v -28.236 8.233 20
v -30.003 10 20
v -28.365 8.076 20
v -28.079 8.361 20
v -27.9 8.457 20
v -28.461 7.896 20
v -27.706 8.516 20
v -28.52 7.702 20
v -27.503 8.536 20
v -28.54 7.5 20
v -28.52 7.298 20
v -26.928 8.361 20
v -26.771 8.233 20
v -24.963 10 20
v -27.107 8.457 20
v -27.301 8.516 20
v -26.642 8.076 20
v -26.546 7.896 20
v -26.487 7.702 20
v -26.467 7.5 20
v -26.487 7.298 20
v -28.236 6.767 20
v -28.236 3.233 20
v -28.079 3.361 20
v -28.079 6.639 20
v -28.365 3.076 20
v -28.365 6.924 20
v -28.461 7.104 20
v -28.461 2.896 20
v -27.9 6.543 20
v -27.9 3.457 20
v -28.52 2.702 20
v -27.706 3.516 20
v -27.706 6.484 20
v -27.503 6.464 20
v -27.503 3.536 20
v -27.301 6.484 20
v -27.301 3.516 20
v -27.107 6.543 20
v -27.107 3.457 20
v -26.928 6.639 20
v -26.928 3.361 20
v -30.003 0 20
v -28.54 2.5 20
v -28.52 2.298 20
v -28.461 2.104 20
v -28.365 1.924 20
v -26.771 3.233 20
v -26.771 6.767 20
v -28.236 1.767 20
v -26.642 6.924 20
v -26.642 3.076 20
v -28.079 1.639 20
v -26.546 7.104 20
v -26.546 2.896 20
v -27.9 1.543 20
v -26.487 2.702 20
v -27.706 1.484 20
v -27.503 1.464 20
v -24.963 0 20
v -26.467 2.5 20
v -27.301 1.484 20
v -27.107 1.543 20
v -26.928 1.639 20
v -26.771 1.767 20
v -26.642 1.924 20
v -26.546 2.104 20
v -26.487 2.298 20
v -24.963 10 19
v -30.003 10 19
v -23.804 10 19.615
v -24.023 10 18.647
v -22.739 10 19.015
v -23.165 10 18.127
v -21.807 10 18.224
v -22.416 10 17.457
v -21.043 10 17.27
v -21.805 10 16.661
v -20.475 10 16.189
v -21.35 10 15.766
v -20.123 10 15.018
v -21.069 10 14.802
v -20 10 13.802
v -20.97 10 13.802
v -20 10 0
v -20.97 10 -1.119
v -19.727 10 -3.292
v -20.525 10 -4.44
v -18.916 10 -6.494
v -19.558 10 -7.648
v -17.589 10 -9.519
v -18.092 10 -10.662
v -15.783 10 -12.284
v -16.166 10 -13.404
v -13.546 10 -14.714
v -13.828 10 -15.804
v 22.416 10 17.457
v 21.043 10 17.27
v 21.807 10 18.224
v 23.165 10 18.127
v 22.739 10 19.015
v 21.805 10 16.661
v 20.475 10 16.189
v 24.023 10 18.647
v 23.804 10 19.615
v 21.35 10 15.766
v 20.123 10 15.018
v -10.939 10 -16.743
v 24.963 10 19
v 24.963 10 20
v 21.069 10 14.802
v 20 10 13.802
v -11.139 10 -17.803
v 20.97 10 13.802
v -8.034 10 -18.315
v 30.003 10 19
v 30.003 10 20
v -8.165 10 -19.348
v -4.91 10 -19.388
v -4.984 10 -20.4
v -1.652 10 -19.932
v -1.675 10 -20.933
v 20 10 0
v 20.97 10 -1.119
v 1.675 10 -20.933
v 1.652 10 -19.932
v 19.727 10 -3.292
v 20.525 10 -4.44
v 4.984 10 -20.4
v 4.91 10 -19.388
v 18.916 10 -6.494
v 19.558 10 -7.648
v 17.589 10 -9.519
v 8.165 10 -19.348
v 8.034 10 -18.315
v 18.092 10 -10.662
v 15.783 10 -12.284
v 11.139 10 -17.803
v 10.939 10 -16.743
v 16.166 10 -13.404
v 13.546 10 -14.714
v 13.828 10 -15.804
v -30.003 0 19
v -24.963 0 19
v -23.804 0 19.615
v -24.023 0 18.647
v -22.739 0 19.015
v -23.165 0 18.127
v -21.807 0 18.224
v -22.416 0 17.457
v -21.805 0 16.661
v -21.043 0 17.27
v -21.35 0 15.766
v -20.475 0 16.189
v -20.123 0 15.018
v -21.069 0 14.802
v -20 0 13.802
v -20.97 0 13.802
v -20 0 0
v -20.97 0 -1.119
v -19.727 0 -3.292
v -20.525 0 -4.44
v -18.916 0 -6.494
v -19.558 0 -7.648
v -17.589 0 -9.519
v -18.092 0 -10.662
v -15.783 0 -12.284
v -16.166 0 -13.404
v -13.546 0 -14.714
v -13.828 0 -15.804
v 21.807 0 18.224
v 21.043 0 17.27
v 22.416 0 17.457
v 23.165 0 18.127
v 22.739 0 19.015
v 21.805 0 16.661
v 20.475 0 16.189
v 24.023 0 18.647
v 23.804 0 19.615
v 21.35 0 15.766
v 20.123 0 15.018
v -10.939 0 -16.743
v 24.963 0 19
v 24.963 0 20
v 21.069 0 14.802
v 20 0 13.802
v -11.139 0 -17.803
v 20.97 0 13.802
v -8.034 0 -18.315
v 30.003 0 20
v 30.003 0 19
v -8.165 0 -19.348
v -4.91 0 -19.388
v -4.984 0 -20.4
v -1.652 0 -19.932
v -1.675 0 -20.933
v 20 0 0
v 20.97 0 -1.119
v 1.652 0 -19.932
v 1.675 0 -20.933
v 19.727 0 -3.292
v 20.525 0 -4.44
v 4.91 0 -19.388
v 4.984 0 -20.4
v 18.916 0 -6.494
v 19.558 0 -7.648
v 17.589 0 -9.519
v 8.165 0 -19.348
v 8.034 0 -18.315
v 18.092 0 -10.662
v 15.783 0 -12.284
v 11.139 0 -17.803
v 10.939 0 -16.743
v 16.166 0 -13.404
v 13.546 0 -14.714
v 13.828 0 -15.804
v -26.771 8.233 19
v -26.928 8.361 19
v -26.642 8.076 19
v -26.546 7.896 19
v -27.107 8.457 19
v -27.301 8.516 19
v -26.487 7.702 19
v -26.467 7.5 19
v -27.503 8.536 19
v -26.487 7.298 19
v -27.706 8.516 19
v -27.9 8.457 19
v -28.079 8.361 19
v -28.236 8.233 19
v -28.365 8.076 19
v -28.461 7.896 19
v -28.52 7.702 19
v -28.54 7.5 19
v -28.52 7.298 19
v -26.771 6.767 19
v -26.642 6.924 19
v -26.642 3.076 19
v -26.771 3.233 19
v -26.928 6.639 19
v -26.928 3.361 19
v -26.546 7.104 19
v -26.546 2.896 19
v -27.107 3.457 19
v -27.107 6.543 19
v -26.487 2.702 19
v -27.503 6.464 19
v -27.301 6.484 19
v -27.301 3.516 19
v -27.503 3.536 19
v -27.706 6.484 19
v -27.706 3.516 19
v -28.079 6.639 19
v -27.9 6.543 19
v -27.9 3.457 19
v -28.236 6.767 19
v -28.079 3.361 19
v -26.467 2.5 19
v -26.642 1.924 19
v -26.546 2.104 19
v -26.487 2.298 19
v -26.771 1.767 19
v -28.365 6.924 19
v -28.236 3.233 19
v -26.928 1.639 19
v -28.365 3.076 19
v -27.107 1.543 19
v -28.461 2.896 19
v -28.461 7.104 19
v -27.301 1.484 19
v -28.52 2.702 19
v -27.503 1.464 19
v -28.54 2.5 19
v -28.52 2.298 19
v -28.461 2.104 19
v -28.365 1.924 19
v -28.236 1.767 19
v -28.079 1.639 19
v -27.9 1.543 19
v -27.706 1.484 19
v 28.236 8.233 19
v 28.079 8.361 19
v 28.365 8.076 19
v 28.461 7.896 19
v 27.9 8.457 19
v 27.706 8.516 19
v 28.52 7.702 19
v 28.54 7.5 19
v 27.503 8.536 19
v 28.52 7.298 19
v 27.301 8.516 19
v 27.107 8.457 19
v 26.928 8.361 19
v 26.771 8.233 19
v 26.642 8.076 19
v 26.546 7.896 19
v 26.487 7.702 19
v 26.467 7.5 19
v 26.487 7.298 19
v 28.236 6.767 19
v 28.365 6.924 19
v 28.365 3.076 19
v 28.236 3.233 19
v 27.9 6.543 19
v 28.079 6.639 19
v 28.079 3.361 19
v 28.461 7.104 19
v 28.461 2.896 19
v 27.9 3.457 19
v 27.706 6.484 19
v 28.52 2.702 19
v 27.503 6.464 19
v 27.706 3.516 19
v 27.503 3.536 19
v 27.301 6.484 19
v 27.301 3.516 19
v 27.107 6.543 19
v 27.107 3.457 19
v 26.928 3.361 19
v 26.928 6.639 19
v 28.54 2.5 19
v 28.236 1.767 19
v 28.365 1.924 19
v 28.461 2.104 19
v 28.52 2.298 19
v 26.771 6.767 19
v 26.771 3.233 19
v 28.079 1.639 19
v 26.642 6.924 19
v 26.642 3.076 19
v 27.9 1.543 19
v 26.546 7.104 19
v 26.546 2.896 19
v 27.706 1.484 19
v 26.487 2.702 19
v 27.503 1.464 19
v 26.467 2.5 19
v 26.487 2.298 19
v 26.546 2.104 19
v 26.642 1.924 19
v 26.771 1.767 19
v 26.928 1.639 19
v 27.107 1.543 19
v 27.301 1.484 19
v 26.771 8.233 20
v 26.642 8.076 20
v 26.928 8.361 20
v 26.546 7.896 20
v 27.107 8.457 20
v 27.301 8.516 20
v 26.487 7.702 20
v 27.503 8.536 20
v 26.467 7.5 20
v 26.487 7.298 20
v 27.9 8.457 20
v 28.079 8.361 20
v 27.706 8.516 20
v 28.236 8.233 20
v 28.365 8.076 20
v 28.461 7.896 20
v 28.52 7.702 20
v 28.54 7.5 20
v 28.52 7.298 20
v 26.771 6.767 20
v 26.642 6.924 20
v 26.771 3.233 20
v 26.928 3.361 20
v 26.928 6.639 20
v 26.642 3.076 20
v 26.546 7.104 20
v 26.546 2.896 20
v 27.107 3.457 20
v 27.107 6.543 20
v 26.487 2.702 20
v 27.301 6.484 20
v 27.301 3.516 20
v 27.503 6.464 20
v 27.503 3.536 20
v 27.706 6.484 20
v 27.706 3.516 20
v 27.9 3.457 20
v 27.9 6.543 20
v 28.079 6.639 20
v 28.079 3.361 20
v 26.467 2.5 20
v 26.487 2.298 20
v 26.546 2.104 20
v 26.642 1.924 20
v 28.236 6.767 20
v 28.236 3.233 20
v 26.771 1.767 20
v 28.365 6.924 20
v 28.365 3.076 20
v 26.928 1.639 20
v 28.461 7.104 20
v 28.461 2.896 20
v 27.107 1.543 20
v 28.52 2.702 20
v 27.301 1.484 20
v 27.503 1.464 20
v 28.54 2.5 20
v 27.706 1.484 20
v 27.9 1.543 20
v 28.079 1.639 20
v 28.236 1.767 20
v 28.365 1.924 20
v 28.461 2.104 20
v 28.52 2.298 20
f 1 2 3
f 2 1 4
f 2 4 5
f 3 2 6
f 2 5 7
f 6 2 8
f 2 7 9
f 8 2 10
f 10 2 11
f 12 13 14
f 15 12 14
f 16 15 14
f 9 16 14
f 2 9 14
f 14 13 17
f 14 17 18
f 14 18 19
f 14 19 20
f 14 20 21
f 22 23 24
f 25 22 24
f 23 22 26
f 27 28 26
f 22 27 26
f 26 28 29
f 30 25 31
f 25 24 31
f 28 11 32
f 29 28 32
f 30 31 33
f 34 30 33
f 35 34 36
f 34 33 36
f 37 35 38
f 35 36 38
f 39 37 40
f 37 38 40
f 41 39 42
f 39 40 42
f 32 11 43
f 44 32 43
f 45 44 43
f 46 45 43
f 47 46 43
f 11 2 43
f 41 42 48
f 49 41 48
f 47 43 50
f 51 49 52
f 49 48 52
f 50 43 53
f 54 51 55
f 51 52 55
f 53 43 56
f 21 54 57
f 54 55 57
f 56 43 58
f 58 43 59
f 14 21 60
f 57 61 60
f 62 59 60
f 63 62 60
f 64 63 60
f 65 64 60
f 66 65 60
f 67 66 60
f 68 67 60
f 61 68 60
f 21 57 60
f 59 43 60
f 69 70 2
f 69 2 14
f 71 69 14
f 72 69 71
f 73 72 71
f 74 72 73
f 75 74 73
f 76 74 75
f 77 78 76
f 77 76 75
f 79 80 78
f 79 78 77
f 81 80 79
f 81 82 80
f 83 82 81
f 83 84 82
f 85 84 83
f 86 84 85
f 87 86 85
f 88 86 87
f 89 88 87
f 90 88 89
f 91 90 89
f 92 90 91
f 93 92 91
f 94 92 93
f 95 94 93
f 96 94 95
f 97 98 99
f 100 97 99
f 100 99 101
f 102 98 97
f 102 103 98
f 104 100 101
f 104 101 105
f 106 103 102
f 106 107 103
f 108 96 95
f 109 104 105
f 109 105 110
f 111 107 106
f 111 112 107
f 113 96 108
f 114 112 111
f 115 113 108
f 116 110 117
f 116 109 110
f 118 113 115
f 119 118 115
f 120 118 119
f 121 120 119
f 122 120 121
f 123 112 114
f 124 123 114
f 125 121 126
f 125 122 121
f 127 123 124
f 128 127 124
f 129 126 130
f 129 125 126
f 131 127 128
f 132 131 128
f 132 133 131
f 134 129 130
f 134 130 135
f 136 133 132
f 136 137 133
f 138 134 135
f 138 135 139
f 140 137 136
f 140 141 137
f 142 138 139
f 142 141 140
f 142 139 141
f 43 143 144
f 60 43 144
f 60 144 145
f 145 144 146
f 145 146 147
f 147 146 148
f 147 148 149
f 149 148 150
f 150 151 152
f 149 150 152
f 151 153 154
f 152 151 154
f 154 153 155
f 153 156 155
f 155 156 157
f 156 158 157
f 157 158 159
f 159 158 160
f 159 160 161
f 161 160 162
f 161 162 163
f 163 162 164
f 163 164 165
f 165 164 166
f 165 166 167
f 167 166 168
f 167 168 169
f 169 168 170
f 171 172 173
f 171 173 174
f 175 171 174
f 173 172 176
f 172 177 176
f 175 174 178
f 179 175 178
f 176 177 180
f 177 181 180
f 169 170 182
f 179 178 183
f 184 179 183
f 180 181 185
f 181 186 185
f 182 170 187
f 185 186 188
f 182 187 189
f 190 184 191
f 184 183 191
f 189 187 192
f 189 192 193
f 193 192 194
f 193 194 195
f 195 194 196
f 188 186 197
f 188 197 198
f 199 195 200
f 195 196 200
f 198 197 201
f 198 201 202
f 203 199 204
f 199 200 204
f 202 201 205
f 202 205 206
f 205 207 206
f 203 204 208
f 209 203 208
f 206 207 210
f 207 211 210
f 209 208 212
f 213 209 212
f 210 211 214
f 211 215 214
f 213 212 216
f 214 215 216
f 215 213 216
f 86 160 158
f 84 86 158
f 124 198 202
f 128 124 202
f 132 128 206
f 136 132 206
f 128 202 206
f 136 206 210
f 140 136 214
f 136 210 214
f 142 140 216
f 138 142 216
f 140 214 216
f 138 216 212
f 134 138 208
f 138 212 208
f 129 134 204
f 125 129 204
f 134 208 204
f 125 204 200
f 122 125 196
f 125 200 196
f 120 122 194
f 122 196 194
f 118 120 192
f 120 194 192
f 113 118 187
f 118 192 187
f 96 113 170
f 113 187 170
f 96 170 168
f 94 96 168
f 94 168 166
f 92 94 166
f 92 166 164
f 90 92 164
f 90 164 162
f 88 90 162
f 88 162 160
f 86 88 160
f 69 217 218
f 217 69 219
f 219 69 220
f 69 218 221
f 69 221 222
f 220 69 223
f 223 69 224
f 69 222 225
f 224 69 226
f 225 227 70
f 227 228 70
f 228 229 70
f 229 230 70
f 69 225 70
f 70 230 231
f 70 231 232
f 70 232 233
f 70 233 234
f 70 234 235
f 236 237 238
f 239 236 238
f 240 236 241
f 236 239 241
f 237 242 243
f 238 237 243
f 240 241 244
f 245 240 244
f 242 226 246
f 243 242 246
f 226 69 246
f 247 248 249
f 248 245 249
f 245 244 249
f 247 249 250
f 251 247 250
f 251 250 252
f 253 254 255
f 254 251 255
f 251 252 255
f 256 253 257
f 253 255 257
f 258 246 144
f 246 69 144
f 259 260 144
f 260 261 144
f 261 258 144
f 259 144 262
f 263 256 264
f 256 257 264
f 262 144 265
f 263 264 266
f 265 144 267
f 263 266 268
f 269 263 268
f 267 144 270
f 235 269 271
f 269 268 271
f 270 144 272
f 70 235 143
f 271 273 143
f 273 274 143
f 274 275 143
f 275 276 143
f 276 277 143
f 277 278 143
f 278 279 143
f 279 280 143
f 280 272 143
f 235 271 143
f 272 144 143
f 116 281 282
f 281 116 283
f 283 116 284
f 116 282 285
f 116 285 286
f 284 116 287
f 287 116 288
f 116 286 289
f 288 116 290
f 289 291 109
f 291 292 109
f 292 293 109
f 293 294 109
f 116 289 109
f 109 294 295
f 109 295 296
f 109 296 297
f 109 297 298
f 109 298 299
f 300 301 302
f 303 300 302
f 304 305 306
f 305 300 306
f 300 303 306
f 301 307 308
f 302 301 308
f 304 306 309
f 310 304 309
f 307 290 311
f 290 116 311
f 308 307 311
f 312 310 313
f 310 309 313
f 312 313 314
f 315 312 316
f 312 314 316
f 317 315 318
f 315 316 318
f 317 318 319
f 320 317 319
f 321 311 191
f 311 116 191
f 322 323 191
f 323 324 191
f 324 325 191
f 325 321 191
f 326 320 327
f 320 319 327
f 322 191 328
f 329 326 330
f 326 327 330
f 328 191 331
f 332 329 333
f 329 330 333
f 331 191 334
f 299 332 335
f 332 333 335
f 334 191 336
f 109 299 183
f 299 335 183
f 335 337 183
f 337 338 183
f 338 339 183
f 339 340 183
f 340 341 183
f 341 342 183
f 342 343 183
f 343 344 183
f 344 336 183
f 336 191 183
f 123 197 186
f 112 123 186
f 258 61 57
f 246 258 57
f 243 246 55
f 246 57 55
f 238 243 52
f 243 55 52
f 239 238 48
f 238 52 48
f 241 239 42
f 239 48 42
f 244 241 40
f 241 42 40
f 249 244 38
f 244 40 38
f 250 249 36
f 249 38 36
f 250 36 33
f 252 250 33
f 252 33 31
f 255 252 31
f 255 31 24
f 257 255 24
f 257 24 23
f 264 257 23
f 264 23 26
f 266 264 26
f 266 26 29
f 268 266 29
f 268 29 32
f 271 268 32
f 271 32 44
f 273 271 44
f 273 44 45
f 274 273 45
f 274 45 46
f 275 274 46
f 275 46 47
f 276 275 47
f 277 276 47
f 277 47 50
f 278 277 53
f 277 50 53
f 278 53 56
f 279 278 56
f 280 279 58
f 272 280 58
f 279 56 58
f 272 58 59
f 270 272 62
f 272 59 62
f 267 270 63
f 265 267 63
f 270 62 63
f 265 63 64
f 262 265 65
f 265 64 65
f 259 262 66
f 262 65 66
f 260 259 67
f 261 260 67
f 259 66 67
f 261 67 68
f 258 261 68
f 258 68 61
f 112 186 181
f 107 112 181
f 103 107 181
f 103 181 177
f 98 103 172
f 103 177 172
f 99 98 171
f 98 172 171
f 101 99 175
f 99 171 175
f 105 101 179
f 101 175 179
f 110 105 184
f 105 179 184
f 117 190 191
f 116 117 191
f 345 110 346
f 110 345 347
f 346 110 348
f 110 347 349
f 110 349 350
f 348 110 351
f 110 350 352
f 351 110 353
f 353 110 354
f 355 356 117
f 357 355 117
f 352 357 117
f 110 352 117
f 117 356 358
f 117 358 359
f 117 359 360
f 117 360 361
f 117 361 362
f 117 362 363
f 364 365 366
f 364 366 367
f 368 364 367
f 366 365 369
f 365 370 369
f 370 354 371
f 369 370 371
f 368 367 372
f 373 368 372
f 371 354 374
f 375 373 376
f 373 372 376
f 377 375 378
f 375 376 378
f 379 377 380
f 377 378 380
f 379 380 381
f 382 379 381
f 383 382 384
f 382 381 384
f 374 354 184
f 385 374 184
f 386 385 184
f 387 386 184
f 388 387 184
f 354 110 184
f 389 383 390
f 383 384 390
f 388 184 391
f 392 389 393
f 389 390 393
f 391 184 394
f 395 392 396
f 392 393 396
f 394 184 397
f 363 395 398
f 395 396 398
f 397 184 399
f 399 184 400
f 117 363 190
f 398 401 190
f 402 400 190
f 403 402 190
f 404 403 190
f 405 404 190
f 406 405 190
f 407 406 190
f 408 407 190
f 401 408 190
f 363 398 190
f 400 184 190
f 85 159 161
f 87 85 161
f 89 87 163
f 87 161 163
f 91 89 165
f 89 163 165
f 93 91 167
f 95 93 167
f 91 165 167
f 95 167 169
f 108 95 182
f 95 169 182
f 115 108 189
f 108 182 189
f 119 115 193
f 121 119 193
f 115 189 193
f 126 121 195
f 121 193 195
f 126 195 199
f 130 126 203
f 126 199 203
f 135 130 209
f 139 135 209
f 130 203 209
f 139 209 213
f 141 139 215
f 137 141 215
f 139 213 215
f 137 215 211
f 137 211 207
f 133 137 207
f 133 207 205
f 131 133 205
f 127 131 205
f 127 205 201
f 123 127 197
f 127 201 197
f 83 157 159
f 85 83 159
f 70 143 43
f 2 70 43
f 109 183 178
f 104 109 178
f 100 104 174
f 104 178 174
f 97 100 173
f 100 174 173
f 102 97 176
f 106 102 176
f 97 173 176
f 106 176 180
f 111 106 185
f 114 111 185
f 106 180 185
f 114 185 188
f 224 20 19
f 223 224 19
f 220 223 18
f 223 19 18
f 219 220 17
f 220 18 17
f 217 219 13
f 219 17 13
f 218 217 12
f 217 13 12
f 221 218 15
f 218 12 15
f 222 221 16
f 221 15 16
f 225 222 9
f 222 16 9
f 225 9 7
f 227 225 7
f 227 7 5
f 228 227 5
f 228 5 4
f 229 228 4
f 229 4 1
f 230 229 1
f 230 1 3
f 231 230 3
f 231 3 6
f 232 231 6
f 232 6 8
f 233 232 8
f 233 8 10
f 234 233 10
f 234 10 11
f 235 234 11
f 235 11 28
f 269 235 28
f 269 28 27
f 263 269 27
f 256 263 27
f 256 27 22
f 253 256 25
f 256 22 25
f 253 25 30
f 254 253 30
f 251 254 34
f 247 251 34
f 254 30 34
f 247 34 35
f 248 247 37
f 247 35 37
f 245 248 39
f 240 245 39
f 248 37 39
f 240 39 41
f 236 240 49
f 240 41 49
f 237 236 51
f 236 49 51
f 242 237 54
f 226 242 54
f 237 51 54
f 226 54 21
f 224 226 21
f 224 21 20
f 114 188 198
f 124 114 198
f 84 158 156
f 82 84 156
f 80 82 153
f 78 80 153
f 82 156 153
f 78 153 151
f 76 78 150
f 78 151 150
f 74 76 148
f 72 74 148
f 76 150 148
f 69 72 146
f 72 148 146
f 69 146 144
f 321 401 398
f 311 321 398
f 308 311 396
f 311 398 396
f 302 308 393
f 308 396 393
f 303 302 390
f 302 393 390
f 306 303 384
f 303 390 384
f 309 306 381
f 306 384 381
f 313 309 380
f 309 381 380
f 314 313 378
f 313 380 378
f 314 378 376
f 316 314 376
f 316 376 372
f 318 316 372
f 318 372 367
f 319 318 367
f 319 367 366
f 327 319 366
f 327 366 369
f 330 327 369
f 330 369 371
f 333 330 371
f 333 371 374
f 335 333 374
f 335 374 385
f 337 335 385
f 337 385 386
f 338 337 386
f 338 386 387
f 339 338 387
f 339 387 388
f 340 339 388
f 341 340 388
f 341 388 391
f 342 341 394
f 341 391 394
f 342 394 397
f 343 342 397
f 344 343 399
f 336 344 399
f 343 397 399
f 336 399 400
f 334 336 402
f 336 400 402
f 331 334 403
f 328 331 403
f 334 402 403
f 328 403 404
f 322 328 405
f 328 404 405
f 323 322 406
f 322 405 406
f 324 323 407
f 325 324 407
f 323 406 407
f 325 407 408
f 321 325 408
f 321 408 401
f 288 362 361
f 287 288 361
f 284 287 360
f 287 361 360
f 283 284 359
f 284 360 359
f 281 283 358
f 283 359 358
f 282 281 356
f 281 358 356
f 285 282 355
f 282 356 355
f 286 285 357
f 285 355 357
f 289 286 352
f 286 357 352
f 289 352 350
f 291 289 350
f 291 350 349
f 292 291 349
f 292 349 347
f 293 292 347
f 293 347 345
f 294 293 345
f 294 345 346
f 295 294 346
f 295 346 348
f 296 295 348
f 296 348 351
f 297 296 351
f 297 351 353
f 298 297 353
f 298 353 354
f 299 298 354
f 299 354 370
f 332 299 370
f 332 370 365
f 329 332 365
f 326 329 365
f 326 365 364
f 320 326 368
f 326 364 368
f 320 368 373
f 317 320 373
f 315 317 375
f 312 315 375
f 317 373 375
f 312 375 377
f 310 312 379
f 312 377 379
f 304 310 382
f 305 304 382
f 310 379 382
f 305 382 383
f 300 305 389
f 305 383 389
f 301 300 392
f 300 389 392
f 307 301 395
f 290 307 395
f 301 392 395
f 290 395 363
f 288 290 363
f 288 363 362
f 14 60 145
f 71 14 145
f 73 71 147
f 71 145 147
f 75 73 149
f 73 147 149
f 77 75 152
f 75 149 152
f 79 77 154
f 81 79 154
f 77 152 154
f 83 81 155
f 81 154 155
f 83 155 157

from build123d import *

# Parameters (mm, degrees)
BOSS_EXTRU_1_DEPTH      = 10
ESQUISSE5_R             = 1.036050106
ENL_V_MAT_EXTRU_2_DEPTH = 42


with BuildPart() as part:
    # Esquisse2 → Boss.-Extru.1 (new body)
    with BuildSketch(Plane(origin=(0, 0, 0), x_dir=(1, 0, 0), z_dir=(0, 1, 0))):
        with BuildLine():
            Line((24.963471106, -20), (30.003471106, -20))
            Line((30.003471106, -20), (30.003471106, -19))
            Line((30.003471106, -19), (24.963471106, -19))
            ThreePointArc((24.963471106, -19), (22.092040168, -17.073276579), (20.970186635, -13.802370983))
            Line((20.970186635, -13.802370983), (20.970186635, 1.118602927))
            ThreePointArc((20.970186635, 1.118602927), (0, 21), (-20.970186635, 1.118602927))
            Line((-20.970186635, 1.118602927), (-20.970186635, -13.802370983))
            ThreePointArc((-20.970186635, -13.802370983), (-22.092040168, -17.073276579), (-24.963471106, -19))
            Line((-24.963471106, -19), (-30.003471106, -19))
            Line((-30.003471106, -19), (-30.003471106, -20))
            Line((-30.003471106, -20), (-24.963471106, -20))
            ThreePointArc((-24.963471106, -20), (-21.402232401, -17.765722993), (-20, -13.802370983))
            Line((-20, -13.802370983), (-20, 0))
            ThreePointArc((-20, 0), (0, 20), (20, 0))
            Line((20, 0), (20, -13.802370983))
            ThreePointArc((20, -13.802370983), (21.402232401, -17.765722993), (24.963471106, -20))
        make_face()
    extrude(amount=BOSS_EXTRU_1_DEPTH)

    # Esquisse5 → Enlèv. mat.-Extru.2 (cut, through all)
    with BuildSketch(Plane.XY.offset(20)):
        with Locations((-27.503471106, 7.5)):
            Circle(ESQUISSE5_R)
        with Locations((-27.503471106, 2.5)):
            Circle(ESQUISSE5_R)
        with Locations((27.503471106, 2.5)):
            Circle(ESQUISSE5_R)
        with Locations((27.503471106, 7.5)):
            Circle(ESQUISSE5_R)
    extrude(amount=-ENL_V_MAT_EXTRU_2_DEPTH, mode=Mode.SUBTRACT)


solid = part.part
